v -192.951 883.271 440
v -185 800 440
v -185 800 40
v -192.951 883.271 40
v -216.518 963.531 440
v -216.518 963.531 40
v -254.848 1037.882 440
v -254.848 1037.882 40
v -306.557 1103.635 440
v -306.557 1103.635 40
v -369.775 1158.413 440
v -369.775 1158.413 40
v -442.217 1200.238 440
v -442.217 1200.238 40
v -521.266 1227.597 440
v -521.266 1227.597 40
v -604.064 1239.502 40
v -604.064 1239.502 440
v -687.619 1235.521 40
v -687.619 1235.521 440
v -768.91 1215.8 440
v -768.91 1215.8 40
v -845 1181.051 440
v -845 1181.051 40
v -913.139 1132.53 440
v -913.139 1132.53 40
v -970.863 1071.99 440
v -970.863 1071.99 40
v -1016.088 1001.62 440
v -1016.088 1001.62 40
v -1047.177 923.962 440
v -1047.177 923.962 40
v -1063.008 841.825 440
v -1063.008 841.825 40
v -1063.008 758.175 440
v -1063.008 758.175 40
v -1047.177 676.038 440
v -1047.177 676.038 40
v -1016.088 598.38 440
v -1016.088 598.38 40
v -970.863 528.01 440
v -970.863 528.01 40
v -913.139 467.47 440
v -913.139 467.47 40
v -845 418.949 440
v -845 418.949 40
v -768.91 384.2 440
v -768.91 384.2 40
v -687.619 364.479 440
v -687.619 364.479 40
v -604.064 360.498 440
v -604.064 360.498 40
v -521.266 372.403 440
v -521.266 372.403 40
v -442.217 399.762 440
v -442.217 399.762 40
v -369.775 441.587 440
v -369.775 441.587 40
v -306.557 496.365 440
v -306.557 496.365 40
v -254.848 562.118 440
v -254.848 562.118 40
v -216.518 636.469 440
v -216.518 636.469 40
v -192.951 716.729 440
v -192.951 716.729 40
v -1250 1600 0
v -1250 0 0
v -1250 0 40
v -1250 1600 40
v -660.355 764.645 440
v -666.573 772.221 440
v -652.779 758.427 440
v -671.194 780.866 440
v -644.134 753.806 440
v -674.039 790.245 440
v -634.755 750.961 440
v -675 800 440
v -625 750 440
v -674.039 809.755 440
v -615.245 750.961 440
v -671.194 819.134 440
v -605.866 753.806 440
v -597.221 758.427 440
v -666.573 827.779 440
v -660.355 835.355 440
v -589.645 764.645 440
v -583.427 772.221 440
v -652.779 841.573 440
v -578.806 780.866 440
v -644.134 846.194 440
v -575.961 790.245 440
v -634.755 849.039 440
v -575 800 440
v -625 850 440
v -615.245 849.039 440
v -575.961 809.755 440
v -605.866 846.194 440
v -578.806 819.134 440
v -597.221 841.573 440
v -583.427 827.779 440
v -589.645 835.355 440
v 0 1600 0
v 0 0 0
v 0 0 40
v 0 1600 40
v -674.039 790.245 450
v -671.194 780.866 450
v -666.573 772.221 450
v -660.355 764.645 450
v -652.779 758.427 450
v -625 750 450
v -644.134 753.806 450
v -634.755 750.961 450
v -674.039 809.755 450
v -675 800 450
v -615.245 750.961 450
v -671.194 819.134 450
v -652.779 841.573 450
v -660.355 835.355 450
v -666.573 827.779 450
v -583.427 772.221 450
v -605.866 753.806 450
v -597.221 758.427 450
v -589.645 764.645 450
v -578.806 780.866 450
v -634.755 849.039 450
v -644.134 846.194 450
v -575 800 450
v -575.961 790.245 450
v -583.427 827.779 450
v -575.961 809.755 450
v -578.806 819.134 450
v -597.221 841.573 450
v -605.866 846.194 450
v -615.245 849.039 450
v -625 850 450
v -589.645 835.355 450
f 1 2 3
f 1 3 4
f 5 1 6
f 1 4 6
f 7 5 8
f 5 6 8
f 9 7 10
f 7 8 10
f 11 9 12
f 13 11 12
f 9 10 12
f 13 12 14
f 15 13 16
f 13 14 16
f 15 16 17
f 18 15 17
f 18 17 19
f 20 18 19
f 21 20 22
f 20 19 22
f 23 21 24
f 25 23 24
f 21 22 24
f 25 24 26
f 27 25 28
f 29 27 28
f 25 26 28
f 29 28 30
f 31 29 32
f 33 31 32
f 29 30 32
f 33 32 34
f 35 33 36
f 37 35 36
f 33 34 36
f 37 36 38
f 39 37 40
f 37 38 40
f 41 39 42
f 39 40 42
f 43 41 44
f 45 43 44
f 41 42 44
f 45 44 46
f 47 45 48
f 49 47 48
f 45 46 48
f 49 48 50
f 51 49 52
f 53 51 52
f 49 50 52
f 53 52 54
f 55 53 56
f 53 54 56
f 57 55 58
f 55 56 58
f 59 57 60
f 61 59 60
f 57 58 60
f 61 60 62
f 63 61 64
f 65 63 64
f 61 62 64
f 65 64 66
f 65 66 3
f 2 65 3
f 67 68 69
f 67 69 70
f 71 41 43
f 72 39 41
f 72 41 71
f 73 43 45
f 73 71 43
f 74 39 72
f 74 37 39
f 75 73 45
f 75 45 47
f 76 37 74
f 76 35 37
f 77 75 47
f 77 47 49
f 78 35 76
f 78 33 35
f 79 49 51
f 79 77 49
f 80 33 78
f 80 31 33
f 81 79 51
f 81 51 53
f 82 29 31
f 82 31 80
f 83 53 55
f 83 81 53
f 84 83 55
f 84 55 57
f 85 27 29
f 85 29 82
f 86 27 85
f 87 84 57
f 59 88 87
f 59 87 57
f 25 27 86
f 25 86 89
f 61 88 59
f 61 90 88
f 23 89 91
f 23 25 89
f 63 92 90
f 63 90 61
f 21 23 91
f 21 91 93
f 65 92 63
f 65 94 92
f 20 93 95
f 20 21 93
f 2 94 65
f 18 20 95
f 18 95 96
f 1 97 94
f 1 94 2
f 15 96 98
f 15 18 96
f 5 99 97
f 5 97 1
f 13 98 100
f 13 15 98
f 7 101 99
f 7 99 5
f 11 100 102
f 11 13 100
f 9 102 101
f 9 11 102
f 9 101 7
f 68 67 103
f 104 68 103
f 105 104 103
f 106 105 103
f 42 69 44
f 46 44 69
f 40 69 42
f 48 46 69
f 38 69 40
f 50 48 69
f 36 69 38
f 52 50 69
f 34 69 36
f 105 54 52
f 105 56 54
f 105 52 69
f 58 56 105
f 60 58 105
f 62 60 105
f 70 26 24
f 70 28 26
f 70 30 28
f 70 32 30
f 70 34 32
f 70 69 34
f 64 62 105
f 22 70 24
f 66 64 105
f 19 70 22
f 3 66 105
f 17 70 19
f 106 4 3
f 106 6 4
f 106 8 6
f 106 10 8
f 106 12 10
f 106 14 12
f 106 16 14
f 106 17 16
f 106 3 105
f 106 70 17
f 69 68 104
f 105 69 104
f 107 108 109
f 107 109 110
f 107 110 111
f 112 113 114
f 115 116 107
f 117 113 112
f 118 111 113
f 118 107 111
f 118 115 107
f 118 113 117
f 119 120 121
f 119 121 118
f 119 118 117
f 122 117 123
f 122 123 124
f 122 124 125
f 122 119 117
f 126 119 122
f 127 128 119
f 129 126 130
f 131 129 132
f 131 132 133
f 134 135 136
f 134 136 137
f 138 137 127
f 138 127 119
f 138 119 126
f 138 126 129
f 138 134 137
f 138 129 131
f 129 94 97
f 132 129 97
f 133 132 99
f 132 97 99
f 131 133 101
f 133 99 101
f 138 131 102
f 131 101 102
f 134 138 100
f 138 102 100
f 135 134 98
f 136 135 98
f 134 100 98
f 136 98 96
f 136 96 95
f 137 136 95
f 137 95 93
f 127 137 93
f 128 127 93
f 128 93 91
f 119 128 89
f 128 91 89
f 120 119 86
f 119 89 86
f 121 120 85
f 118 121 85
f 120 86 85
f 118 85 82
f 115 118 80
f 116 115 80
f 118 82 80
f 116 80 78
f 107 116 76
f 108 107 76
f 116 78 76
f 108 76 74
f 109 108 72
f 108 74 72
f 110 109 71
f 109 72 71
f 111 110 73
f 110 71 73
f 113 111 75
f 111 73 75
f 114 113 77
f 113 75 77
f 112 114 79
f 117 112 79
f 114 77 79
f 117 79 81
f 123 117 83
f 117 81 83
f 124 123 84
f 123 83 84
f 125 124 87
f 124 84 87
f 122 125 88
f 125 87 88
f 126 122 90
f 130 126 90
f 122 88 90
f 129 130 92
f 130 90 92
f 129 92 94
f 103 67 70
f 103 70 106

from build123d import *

# Parameters (mm, degrees)
ESQUISSE1_W        = 1250
ESQUISSE1_H        = 1600
BOSS_EXTRU_1_DEPTH = 40
ESQUISSE2_R        = 440
BOSS_EXTRU_2_DEPTH = 400
ESQUISSE3_R        = 50
BOSS_EXTRU_3_DEPTH = 10


with BuildPart() as part:
    # Esquisse1 → Boss.-Extru.1 (new body)
    with BuildSketch(Plane.XY):
        with Locations((-625, 800)):
            Rectangle(ESQUISSE1_W, ESQUISSE1_H)
    extrude(amount=BOSS_EXTRU_1_DEPTH)

    # Esquisse2 → Boss.-Extru.2 (add)
    with BuildSketch(Plane.XY.offset(40)):
        with Locations((-625, 800)):
            Circle(ESQUISSE2_R)
    extrude(amount=BOSS_EXTRU_2_DEPTH)

    # Esquisse3 → Boss.-Extru.3 (add)
    with BuildSketch(Plane.XY.offset(440)):
        with Locations((-625, 800)):
            Circle(ESQUISSE3_R)
    extrude(amount=BOSS_EXTRU_3_DEPTH)


solid = part.part
